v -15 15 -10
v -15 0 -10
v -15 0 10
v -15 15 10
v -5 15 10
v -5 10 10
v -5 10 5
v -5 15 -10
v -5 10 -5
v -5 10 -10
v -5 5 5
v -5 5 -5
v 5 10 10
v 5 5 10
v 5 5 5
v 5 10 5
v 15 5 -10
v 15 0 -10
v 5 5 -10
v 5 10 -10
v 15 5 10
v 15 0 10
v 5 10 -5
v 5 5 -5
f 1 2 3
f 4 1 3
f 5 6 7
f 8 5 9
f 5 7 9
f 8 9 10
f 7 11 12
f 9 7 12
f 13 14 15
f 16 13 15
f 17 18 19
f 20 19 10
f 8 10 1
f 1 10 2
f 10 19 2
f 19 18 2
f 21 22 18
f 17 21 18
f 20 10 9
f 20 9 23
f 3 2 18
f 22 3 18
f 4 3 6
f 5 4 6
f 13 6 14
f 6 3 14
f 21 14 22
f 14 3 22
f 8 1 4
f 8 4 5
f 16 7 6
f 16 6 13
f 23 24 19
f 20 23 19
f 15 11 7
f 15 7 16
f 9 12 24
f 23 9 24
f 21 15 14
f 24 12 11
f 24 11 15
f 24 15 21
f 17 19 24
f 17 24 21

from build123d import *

# Parameters (mm, degrees)
SKETCH_1_W      = 30
SKETCH_1_H      = 20
EXTRUDE_1_DEPTH = 5
EXTRUDE_2_DEPTH = 10
EXTRUDE_3_DEPTH = 15


with BuildPart() as part:
    # 草圖1 → 填料-伸長1 (new body)
    with BuildSketch(Plane(origin=(0, 0, 0), x_dir=(1, 0, 0), z_dir=(0, 1, 0))):
        Rectangle(SKETCH_1_W, SKETCH_1_H)
    extrude(amount=EXTRUDE_1_DEPTH)

    # 草圖1<3> → 填料-伸長2 (add)
    with BuildSketch(Plane(origin=(0, 0, 0), x_dir=(1, 0, 0), z_dir=(0, 1, 0))):
        Polygon((5, 10), (-15, 10), (-15, -10), (5, -10), (5, -5), (-5, -5), (-5, 5), (5, 5), align=None)
    extrude(amount=EXTRUDE_2_DEPTH)

    # 草圖1<4> → 填料-伸長3 (add)
    with BuildSketch(Plane(origin=(0, 0, 0), x_dir=(1, 0, 0), z_dir=(0, 1, 0))):
        Polygon((-5, 5), (-5, 10), (-15, 10), (-15, -10), (-5, -10), (-5, -5), align=None)
    extrude(amount=EXTRUDE_3_DEPTH)


solid = part.part
